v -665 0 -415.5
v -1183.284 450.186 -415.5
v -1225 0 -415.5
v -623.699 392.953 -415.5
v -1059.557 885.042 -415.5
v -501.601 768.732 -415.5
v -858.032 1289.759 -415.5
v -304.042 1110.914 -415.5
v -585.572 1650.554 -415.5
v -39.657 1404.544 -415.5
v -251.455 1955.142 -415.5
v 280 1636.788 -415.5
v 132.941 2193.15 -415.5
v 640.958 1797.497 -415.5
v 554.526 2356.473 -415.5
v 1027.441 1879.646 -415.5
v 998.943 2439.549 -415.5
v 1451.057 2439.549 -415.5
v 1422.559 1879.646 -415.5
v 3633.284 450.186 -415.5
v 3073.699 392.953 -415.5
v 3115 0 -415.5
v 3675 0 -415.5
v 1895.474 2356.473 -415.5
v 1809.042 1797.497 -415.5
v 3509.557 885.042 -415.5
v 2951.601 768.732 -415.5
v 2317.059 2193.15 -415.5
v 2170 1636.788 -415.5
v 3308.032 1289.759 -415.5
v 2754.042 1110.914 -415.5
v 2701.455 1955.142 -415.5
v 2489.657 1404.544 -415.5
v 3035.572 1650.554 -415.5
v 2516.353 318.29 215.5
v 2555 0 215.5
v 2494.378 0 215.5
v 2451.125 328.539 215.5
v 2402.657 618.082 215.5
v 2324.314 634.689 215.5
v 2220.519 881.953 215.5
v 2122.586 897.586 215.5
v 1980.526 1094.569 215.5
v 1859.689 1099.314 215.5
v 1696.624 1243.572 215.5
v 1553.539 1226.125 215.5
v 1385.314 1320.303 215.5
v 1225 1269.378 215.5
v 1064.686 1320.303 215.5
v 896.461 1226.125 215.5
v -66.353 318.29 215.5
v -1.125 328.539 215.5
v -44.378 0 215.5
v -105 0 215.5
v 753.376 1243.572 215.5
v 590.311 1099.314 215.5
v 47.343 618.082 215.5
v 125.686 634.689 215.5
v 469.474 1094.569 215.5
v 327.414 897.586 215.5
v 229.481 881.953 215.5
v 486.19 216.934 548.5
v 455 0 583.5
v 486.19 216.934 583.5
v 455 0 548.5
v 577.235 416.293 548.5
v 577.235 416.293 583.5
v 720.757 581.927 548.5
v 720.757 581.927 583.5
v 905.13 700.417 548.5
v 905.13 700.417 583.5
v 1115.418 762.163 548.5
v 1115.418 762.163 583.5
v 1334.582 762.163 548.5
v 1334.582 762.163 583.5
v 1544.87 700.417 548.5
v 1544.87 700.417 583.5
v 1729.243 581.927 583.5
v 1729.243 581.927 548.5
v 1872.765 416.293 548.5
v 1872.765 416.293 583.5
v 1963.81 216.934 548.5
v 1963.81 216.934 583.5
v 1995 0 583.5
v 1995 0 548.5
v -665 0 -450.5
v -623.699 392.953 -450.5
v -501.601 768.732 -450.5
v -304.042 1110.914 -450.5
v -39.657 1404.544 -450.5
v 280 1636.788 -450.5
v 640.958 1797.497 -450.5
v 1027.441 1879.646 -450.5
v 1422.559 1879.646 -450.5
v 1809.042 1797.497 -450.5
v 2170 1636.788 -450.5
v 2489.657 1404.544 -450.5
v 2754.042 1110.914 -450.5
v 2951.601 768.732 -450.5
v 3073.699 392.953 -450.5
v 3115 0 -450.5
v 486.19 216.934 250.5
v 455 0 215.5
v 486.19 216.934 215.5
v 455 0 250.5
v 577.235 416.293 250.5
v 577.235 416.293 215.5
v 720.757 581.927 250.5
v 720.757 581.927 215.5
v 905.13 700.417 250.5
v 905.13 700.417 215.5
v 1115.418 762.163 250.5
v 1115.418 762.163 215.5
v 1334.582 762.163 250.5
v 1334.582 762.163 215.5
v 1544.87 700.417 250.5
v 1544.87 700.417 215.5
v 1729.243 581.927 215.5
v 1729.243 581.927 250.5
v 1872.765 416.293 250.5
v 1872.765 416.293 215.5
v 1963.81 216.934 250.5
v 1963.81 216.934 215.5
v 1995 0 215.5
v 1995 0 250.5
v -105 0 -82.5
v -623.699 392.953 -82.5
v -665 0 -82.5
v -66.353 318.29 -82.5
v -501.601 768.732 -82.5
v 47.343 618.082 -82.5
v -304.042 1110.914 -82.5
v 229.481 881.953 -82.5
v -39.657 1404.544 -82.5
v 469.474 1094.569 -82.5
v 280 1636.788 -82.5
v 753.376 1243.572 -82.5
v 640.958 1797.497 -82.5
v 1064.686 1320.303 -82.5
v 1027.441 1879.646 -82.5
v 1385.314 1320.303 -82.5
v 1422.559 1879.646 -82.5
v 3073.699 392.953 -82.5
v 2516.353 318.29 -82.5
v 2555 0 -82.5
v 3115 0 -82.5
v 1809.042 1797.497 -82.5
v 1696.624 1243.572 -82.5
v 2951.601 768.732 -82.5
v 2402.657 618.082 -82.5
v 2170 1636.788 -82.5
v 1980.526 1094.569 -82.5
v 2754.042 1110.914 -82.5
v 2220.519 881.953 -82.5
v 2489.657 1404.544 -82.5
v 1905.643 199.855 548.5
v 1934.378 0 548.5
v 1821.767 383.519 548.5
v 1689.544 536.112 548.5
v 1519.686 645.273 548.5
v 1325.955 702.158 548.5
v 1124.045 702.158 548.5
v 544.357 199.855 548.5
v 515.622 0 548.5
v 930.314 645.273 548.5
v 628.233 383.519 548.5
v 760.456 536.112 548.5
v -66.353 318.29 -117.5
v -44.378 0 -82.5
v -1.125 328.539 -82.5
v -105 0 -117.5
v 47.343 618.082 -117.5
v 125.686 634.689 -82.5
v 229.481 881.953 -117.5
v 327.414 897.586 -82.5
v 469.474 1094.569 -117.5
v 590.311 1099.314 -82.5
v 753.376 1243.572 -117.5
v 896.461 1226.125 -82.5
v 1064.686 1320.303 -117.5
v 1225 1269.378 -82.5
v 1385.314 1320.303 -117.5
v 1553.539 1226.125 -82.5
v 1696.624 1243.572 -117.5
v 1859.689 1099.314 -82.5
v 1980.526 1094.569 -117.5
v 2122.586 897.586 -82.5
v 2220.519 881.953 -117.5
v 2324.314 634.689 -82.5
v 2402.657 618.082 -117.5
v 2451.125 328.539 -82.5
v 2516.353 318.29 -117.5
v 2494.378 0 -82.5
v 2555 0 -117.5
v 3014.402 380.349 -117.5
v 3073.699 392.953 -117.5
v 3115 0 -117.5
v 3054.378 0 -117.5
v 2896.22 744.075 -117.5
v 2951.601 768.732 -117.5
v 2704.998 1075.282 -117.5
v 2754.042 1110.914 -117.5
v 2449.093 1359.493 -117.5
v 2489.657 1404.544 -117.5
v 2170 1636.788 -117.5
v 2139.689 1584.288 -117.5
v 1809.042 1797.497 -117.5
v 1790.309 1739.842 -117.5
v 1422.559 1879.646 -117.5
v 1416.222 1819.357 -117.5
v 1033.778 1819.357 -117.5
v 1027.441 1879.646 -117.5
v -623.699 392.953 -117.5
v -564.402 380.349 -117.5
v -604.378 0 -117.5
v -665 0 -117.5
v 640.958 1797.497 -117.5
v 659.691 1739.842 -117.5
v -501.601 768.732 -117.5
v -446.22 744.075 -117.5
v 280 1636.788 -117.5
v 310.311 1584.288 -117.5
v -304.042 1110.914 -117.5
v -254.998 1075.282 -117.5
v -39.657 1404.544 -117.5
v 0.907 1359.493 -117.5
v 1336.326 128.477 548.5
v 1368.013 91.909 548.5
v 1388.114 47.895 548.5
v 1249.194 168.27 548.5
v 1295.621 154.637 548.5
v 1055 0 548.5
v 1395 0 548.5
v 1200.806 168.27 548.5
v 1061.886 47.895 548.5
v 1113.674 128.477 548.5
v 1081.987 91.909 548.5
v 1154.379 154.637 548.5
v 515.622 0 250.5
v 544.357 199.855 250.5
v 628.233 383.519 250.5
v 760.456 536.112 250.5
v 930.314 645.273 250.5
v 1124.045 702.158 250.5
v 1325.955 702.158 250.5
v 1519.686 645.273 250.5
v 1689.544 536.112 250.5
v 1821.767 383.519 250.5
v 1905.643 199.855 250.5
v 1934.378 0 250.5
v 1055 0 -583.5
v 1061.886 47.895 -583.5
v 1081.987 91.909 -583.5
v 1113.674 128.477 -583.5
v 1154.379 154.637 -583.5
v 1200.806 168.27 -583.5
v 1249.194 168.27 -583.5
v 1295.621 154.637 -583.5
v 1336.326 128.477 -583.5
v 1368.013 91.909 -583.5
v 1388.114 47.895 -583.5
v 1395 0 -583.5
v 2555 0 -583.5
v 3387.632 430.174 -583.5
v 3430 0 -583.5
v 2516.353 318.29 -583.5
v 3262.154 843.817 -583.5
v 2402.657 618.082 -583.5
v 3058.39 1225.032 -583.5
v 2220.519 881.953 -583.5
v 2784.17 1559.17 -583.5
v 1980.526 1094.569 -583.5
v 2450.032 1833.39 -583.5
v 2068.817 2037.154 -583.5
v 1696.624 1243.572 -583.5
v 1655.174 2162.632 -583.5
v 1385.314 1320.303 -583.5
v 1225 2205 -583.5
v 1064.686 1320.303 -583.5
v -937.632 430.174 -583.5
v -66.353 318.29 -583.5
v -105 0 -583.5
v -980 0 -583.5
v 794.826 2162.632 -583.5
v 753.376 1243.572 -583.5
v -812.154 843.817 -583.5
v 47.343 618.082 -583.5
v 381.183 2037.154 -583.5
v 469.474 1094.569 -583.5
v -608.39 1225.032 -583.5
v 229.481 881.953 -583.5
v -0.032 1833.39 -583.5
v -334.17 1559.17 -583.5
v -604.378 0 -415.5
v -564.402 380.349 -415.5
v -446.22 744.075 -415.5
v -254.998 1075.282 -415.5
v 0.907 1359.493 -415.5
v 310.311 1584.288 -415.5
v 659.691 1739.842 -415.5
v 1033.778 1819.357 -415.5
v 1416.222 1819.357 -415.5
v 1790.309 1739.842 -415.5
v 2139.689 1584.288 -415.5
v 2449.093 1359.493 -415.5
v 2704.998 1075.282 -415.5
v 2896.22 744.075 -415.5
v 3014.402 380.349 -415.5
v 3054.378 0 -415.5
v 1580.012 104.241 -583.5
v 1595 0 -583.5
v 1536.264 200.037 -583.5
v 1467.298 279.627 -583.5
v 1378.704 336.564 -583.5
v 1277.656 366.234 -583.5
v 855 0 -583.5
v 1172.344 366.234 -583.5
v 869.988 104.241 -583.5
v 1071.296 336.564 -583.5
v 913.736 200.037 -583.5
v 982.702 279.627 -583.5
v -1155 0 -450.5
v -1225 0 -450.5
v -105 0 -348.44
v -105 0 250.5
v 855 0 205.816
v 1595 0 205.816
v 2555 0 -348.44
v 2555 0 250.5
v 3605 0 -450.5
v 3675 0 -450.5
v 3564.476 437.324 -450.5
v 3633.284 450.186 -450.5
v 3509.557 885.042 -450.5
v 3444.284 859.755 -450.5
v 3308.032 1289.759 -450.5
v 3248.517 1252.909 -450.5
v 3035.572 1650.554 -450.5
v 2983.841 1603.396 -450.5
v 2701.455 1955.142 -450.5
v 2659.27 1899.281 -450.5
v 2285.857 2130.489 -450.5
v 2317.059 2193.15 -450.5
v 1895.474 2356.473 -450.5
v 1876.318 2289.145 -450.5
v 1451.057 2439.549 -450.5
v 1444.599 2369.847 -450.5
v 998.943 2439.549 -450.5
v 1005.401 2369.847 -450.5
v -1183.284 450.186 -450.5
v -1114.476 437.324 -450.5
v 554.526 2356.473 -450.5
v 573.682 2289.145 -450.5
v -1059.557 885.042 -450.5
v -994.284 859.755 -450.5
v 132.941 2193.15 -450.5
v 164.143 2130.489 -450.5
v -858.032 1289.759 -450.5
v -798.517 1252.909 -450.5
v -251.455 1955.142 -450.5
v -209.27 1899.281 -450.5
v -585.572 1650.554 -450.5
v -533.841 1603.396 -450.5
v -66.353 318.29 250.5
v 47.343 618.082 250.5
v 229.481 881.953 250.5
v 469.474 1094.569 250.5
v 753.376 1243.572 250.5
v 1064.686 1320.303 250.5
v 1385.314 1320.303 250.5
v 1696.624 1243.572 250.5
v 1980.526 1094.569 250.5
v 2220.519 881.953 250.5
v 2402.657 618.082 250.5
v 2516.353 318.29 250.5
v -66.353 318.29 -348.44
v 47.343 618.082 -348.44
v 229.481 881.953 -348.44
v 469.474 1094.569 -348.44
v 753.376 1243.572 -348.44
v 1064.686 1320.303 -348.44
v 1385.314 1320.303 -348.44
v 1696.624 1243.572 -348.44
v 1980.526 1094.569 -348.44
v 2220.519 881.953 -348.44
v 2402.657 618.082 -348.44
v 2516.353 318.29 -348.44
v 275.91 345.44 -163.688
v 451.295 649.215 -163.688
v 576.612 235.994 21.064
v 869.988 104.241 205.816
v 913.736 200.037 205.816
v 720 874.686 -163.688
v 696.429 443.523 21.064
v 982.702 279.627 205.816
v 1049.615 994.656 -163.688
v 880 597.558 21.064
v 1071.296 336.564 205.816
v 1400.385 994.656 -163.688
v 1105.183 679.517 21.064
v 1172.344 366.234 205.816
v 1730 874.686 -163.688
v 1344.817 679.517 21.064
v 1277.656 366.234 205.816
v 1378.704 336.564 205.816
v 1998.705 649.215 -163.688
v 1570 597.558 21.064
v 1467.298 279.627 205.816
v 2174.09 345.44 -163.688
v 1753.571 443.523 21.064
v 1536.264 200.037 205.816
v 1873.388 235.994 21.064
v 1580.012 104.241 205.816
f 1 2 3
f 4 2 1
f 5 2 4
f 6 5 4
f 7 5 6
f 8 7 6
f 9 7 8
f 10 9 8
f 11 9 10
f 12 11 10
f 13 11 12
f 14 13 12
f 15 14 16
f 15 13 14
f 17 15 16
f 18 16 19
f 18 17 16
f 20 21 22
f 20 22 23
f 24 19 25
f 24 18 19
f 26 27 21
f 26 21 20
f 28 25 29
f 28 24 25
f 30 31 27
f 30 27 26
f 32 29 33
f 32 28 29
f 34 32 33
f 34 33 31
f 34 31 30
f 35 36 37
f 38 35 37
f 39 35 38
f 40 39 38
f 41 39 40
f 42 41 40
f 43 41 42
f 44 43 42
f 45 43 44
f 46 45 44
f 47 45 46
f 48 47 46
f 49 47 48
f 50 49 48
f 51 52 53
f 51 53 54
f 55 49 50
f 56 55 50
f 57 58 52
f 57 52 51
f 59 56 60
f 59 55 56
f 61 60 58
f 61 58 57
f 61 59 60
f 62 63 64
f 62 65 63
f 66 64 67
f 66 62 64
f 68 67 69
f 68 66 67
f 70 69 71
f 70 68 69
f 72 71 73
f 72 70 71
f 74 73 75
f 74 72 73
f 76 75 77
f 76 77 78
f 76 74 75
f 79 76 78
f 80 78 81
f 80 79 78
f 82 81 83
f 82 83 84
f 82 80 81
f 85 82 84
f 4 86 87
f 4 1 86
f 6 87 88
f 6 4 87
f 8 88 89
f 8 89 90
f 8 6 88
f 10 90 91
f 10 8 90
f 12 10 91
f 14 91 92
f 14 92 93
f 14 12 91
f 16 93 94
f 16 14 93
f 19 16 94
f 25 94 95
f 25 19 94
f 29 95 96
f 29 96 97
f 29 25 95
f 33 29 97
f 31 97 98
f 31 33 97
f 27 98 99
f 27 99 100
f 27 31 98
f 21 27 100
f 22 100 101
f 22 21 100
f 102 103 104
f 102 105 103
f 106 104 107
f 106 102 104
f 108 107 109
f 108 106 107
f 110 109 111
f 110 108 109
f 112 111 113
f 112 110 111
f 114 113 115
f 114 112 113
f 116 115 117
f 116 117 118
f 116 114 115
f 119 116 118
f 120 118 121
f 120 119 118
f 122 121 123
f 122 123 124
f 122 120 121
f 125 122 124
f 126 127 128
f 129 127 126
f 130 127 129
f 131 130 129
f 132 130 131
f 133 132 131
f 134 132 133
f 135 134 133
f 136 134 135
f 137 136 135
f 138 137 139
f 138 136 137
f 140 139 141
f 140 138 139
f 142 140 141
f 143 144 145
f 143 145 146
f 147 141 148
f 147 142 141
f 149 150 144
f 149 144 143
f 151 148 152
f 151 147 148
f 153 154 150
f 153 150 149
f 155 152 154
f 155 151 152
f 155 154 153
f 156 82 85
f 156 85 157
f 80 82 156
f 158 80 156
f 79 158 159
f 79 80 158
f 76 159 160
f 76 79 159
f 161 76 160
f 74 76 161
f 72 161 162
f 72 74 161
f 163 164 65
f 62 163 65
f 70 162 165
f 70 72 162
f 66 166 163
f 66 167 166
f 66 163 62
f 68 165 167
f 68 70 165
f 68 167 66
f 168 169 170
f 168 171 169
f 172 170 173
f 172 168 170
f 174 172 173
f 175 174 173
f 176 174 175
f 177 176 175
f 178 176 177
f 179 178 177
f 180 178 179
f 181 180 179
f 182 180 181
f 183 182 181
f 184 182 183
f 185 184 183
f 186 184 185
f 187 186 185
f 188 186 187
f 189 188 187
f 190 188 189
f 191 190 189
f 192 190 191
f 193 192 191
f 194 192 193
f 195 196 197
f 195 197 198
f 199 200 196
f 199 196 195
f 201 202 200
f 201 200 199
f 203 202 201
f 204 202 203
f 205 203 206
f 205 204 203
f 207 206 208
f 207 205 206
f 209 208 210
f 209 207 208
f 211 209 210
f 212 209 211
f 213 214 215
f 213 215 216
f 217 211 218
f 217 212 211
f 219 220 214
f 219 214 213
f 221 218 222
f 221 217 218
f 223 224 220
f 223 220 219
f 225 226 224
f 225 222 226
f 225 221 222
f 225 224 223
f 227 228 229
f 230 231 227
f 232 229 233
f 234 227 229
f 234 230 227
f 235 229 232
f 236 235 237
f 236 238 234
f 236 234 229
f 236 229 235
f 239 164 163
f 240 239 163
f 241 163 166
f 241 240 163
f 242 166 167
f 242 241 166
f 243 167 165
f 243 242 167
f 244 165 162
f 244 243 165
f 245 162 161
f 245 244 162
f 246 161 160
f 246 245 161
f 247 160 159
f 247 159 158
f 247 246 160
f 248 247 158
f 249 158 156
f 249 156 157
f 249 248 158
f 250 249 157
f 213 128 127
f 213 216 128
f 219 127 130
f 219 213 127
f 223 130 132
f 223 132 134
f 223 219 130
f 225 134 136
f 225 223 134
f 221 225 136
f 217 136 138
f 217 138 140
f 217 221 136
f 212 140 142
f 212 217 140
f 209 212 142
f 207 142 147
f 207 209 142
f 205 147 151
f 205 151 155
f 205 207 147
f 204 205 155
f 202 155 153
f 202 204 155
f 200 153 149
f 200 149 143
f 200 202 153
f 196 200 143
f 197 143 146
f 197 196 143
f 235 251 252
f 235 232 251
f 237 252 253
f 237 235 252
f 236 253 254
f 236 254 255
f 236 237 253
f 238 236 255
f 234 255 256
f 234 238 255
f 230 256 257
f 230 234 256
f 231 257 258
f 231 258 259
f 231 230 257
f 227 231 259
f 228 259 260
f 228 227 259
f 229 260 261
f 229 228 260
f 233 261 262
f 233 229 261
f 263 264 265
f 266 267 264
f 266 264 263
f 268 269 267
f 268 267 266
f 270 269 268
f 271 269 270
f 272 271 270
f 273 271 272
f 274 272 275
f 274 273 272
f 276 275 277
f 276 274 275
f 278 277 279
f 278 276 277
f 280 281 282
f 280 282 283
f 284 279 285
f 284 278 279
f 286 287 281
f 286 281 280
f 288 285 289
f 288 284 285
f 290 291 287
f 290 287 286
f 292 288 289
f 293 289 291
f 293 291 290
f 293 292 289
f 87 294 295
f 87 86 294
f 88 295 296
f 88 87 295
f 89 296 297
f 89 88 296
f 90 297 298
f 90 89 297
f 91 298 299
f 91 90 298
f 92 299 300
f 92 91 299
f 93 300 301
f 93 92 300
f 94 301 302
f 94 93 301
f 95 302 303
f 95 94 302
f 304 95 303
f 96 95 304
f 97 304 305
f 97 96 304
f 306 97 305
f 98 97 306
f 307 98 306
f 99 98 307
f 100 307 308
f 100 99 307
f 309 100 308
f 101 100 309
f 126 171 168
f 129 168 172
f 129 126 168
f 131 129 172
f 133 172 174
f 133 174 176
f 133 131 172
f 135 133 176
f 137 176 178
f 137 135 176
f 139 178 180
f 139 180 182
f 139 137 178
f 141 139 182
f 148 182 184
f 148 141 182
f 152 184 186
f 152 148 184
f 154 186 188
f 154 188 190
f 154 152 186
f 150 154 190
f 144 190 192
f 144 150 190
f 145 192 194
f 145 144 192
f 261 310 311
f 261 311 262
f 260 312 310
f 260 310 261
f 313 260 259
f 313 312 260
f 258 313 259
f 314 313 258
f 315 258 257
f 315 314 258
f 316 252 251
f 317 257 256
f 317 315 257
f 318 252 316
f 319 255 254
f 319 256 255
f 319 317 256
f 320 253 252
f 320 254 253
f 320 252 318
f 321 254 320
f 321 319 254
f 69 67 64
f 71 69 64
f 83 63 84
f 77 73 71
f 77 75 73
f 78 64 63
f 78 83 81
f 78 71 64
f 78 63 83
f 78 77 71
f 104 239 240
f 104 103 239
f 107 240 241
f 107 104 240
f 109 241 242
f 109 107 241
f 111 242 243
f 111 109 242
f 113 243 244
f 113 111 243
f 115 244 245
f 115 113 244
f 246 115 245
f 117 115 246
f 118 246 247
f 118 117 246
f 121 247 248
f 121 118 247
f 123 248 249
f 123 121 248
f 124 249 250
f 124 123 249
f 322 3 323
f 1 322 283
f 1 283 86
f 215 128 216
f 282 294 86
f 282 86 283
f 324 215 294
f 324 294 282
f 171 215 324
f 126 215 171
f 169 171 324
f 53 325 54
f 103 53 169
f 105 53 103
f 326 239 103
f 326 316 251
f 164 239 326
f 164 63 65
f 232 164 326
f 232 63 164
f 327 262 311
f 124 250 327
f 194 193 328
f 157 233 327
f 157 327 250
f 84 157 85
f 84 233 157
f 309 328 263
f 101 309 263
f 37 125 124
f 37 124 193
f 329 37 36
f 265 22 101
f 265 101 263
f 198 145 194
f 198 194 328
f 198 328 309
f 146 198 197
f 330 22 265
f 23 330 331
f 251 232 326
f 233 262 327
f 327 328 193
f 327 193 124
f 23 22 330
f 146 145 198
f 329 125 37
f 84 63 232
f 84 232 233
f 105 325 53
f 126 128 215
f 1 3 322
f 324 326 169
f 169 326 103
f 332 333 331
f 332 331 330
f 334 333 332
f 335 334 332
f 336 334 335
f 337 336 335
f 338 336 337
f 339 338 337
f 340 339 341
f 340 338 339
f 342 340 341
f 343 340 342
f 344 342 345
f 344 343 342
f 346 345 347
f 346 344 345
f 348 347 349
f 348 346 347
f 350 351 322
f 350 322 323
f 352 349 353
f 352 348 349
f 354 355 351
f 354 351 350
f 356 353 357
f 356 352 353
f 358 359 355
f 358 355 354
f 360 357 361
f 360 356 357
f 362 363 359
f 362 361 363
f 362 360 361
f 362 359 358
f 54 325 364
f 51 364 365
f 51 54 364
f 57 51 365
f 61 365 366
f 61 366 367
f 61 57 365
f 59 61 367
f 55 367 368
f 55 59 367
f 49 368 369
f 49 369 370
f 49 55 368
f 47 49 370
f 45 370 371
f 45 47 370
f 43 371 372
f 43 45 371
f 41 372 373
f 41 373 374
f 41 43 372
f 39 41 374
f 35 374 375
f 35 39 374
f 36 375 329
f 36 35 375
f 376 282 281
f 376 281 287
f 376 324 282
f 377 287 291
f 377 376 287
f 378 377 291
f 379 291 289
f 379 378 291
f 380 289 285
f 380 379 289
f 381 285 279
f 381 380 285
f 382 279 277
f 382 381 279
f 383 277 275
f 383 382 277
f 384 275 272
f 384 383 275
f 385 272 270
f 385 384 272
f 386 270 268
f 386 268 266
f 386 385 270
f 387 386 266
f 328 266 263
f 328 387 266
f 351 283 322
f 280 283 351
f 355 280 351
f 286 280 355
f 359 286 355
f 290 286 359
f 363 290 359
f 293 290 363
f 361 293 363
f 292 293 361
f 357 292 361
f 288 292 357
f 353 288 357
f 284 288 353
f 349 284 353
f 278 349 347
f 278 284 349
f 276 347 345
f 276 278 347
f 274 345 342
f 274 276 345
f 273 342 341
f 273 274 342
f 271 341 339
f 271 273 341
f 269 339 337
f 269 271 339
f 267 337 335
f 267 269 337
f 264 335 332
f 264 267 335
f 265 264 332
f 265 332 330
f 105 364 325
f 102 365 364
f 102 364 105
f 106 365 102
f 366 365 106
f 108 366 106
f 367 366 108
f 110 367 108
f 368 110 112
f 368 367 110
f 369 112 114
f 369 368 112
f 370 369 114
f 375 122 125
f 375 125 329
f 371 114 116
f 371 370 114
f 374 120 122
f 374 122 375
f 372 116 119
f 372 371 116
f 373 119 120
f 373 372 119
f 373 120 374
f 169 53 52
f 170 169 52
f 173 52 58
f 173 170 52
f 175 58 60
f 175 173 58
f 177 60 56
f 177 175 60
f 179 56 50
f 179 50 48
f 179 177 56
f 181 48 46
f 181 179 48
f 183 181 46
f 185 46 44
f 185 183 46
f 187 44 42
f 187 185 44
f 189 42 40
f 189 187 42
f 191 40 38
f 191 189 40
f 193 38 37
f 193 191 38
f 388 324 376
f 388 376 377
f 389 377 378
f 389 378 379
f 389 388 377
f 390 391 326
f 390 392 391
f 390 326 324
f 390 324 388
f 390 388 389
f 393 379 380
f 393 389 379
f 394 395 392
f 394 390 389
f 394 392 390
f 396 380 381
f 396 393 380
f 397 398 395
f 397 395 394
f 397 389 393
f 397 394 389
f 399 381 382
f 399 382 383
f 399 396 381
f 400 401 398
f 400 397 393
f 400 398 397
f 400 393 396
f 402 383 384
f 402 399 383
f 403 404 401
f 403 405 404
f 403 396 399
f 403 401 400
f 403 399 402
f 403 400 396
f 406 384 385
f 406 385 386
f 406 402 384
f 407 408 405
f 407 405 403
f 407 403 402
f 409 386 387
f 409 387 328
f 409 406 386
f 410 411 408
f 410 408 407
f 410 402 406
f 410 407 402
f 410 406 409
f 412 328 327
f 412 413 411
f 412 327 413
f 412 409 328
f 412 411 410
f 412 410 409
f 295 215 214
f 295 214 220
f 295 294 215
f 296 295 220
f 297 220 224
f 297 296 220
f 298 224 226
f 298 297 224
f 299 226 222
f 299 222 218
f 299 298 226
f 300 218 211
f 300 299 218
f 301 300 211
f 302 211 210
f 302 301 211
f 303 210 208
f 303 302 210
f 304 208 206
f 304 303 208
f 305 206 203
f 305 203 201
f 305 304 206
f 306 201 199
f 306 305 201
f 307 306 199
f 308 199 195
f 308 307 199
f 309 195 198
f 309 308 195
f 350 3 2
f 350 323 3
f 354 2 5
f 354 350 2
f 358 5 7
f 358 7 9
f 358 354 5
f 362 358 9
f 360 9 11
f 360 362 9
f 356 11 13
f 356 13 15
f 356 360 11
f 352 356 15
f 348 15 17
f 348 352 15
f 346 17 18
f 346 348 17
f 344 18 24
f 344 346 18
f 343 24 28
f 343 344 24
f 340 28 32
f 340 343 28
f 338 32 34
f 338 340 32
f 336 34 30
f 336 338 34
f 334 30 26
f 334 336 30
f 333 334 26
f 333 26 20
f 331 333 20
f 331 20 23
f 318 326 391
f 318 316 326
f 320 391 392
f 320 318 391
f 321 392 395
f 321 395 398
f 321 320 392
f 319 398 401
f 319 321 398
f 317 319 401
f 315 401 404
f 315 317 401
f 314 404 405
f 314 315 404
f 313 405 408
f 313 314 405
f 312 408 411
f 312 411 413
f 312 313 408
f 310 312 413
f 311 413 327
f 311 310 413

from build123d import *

# Parameters (mm, degrees)
F1_ANGLE = 180


with BuildPart() as f1:
    # F0 (on Front) → F1 (revolve)
    with BuildSketch(Plane.XZ):
        Polygon((1055, -583.5), (1055, 548.5), (515.621778, 548.5), (515.621778, 250.5), (455, 215.5), (-44.378222, 215.5), (-44.378222, -82.5), (-105, -117.5), (-604.378222, -117.5), (-604.378222, -415.5), (-665, -450.5), (-1155, -450.5), (-980, -583.5), (-105, -583.5), (-105, -348.440108), (855, 205.816151), (855, -583.5), align=None)
        Polygon((-1225, -450.5), (-1155, -450.5), (-665, -450.5), (-665, -415.5), (-1225, -415.5), align=None)
        Polygon((-604.378222, -117.5), (-105, -117.5), (-105, -82.5), (-665, -82.5), (-665, -117.5), align=None)
        Polygon((-44.378222, 215.5), (455, 215.5), (455, 250.5), (-105, 250.5), (-105, 215.5), align=None)
        Polygon((1225, 548.5), (1225, 583.5), (455, 583.5), (455, 548.5), (515.621778, 548.5), (1055, 548.5), align=None)
    revolve(axis=Axis((1225, 0, 566), (0, 0, -1)), revolution_arc=F1_ANGLE)


solid = f1.part
